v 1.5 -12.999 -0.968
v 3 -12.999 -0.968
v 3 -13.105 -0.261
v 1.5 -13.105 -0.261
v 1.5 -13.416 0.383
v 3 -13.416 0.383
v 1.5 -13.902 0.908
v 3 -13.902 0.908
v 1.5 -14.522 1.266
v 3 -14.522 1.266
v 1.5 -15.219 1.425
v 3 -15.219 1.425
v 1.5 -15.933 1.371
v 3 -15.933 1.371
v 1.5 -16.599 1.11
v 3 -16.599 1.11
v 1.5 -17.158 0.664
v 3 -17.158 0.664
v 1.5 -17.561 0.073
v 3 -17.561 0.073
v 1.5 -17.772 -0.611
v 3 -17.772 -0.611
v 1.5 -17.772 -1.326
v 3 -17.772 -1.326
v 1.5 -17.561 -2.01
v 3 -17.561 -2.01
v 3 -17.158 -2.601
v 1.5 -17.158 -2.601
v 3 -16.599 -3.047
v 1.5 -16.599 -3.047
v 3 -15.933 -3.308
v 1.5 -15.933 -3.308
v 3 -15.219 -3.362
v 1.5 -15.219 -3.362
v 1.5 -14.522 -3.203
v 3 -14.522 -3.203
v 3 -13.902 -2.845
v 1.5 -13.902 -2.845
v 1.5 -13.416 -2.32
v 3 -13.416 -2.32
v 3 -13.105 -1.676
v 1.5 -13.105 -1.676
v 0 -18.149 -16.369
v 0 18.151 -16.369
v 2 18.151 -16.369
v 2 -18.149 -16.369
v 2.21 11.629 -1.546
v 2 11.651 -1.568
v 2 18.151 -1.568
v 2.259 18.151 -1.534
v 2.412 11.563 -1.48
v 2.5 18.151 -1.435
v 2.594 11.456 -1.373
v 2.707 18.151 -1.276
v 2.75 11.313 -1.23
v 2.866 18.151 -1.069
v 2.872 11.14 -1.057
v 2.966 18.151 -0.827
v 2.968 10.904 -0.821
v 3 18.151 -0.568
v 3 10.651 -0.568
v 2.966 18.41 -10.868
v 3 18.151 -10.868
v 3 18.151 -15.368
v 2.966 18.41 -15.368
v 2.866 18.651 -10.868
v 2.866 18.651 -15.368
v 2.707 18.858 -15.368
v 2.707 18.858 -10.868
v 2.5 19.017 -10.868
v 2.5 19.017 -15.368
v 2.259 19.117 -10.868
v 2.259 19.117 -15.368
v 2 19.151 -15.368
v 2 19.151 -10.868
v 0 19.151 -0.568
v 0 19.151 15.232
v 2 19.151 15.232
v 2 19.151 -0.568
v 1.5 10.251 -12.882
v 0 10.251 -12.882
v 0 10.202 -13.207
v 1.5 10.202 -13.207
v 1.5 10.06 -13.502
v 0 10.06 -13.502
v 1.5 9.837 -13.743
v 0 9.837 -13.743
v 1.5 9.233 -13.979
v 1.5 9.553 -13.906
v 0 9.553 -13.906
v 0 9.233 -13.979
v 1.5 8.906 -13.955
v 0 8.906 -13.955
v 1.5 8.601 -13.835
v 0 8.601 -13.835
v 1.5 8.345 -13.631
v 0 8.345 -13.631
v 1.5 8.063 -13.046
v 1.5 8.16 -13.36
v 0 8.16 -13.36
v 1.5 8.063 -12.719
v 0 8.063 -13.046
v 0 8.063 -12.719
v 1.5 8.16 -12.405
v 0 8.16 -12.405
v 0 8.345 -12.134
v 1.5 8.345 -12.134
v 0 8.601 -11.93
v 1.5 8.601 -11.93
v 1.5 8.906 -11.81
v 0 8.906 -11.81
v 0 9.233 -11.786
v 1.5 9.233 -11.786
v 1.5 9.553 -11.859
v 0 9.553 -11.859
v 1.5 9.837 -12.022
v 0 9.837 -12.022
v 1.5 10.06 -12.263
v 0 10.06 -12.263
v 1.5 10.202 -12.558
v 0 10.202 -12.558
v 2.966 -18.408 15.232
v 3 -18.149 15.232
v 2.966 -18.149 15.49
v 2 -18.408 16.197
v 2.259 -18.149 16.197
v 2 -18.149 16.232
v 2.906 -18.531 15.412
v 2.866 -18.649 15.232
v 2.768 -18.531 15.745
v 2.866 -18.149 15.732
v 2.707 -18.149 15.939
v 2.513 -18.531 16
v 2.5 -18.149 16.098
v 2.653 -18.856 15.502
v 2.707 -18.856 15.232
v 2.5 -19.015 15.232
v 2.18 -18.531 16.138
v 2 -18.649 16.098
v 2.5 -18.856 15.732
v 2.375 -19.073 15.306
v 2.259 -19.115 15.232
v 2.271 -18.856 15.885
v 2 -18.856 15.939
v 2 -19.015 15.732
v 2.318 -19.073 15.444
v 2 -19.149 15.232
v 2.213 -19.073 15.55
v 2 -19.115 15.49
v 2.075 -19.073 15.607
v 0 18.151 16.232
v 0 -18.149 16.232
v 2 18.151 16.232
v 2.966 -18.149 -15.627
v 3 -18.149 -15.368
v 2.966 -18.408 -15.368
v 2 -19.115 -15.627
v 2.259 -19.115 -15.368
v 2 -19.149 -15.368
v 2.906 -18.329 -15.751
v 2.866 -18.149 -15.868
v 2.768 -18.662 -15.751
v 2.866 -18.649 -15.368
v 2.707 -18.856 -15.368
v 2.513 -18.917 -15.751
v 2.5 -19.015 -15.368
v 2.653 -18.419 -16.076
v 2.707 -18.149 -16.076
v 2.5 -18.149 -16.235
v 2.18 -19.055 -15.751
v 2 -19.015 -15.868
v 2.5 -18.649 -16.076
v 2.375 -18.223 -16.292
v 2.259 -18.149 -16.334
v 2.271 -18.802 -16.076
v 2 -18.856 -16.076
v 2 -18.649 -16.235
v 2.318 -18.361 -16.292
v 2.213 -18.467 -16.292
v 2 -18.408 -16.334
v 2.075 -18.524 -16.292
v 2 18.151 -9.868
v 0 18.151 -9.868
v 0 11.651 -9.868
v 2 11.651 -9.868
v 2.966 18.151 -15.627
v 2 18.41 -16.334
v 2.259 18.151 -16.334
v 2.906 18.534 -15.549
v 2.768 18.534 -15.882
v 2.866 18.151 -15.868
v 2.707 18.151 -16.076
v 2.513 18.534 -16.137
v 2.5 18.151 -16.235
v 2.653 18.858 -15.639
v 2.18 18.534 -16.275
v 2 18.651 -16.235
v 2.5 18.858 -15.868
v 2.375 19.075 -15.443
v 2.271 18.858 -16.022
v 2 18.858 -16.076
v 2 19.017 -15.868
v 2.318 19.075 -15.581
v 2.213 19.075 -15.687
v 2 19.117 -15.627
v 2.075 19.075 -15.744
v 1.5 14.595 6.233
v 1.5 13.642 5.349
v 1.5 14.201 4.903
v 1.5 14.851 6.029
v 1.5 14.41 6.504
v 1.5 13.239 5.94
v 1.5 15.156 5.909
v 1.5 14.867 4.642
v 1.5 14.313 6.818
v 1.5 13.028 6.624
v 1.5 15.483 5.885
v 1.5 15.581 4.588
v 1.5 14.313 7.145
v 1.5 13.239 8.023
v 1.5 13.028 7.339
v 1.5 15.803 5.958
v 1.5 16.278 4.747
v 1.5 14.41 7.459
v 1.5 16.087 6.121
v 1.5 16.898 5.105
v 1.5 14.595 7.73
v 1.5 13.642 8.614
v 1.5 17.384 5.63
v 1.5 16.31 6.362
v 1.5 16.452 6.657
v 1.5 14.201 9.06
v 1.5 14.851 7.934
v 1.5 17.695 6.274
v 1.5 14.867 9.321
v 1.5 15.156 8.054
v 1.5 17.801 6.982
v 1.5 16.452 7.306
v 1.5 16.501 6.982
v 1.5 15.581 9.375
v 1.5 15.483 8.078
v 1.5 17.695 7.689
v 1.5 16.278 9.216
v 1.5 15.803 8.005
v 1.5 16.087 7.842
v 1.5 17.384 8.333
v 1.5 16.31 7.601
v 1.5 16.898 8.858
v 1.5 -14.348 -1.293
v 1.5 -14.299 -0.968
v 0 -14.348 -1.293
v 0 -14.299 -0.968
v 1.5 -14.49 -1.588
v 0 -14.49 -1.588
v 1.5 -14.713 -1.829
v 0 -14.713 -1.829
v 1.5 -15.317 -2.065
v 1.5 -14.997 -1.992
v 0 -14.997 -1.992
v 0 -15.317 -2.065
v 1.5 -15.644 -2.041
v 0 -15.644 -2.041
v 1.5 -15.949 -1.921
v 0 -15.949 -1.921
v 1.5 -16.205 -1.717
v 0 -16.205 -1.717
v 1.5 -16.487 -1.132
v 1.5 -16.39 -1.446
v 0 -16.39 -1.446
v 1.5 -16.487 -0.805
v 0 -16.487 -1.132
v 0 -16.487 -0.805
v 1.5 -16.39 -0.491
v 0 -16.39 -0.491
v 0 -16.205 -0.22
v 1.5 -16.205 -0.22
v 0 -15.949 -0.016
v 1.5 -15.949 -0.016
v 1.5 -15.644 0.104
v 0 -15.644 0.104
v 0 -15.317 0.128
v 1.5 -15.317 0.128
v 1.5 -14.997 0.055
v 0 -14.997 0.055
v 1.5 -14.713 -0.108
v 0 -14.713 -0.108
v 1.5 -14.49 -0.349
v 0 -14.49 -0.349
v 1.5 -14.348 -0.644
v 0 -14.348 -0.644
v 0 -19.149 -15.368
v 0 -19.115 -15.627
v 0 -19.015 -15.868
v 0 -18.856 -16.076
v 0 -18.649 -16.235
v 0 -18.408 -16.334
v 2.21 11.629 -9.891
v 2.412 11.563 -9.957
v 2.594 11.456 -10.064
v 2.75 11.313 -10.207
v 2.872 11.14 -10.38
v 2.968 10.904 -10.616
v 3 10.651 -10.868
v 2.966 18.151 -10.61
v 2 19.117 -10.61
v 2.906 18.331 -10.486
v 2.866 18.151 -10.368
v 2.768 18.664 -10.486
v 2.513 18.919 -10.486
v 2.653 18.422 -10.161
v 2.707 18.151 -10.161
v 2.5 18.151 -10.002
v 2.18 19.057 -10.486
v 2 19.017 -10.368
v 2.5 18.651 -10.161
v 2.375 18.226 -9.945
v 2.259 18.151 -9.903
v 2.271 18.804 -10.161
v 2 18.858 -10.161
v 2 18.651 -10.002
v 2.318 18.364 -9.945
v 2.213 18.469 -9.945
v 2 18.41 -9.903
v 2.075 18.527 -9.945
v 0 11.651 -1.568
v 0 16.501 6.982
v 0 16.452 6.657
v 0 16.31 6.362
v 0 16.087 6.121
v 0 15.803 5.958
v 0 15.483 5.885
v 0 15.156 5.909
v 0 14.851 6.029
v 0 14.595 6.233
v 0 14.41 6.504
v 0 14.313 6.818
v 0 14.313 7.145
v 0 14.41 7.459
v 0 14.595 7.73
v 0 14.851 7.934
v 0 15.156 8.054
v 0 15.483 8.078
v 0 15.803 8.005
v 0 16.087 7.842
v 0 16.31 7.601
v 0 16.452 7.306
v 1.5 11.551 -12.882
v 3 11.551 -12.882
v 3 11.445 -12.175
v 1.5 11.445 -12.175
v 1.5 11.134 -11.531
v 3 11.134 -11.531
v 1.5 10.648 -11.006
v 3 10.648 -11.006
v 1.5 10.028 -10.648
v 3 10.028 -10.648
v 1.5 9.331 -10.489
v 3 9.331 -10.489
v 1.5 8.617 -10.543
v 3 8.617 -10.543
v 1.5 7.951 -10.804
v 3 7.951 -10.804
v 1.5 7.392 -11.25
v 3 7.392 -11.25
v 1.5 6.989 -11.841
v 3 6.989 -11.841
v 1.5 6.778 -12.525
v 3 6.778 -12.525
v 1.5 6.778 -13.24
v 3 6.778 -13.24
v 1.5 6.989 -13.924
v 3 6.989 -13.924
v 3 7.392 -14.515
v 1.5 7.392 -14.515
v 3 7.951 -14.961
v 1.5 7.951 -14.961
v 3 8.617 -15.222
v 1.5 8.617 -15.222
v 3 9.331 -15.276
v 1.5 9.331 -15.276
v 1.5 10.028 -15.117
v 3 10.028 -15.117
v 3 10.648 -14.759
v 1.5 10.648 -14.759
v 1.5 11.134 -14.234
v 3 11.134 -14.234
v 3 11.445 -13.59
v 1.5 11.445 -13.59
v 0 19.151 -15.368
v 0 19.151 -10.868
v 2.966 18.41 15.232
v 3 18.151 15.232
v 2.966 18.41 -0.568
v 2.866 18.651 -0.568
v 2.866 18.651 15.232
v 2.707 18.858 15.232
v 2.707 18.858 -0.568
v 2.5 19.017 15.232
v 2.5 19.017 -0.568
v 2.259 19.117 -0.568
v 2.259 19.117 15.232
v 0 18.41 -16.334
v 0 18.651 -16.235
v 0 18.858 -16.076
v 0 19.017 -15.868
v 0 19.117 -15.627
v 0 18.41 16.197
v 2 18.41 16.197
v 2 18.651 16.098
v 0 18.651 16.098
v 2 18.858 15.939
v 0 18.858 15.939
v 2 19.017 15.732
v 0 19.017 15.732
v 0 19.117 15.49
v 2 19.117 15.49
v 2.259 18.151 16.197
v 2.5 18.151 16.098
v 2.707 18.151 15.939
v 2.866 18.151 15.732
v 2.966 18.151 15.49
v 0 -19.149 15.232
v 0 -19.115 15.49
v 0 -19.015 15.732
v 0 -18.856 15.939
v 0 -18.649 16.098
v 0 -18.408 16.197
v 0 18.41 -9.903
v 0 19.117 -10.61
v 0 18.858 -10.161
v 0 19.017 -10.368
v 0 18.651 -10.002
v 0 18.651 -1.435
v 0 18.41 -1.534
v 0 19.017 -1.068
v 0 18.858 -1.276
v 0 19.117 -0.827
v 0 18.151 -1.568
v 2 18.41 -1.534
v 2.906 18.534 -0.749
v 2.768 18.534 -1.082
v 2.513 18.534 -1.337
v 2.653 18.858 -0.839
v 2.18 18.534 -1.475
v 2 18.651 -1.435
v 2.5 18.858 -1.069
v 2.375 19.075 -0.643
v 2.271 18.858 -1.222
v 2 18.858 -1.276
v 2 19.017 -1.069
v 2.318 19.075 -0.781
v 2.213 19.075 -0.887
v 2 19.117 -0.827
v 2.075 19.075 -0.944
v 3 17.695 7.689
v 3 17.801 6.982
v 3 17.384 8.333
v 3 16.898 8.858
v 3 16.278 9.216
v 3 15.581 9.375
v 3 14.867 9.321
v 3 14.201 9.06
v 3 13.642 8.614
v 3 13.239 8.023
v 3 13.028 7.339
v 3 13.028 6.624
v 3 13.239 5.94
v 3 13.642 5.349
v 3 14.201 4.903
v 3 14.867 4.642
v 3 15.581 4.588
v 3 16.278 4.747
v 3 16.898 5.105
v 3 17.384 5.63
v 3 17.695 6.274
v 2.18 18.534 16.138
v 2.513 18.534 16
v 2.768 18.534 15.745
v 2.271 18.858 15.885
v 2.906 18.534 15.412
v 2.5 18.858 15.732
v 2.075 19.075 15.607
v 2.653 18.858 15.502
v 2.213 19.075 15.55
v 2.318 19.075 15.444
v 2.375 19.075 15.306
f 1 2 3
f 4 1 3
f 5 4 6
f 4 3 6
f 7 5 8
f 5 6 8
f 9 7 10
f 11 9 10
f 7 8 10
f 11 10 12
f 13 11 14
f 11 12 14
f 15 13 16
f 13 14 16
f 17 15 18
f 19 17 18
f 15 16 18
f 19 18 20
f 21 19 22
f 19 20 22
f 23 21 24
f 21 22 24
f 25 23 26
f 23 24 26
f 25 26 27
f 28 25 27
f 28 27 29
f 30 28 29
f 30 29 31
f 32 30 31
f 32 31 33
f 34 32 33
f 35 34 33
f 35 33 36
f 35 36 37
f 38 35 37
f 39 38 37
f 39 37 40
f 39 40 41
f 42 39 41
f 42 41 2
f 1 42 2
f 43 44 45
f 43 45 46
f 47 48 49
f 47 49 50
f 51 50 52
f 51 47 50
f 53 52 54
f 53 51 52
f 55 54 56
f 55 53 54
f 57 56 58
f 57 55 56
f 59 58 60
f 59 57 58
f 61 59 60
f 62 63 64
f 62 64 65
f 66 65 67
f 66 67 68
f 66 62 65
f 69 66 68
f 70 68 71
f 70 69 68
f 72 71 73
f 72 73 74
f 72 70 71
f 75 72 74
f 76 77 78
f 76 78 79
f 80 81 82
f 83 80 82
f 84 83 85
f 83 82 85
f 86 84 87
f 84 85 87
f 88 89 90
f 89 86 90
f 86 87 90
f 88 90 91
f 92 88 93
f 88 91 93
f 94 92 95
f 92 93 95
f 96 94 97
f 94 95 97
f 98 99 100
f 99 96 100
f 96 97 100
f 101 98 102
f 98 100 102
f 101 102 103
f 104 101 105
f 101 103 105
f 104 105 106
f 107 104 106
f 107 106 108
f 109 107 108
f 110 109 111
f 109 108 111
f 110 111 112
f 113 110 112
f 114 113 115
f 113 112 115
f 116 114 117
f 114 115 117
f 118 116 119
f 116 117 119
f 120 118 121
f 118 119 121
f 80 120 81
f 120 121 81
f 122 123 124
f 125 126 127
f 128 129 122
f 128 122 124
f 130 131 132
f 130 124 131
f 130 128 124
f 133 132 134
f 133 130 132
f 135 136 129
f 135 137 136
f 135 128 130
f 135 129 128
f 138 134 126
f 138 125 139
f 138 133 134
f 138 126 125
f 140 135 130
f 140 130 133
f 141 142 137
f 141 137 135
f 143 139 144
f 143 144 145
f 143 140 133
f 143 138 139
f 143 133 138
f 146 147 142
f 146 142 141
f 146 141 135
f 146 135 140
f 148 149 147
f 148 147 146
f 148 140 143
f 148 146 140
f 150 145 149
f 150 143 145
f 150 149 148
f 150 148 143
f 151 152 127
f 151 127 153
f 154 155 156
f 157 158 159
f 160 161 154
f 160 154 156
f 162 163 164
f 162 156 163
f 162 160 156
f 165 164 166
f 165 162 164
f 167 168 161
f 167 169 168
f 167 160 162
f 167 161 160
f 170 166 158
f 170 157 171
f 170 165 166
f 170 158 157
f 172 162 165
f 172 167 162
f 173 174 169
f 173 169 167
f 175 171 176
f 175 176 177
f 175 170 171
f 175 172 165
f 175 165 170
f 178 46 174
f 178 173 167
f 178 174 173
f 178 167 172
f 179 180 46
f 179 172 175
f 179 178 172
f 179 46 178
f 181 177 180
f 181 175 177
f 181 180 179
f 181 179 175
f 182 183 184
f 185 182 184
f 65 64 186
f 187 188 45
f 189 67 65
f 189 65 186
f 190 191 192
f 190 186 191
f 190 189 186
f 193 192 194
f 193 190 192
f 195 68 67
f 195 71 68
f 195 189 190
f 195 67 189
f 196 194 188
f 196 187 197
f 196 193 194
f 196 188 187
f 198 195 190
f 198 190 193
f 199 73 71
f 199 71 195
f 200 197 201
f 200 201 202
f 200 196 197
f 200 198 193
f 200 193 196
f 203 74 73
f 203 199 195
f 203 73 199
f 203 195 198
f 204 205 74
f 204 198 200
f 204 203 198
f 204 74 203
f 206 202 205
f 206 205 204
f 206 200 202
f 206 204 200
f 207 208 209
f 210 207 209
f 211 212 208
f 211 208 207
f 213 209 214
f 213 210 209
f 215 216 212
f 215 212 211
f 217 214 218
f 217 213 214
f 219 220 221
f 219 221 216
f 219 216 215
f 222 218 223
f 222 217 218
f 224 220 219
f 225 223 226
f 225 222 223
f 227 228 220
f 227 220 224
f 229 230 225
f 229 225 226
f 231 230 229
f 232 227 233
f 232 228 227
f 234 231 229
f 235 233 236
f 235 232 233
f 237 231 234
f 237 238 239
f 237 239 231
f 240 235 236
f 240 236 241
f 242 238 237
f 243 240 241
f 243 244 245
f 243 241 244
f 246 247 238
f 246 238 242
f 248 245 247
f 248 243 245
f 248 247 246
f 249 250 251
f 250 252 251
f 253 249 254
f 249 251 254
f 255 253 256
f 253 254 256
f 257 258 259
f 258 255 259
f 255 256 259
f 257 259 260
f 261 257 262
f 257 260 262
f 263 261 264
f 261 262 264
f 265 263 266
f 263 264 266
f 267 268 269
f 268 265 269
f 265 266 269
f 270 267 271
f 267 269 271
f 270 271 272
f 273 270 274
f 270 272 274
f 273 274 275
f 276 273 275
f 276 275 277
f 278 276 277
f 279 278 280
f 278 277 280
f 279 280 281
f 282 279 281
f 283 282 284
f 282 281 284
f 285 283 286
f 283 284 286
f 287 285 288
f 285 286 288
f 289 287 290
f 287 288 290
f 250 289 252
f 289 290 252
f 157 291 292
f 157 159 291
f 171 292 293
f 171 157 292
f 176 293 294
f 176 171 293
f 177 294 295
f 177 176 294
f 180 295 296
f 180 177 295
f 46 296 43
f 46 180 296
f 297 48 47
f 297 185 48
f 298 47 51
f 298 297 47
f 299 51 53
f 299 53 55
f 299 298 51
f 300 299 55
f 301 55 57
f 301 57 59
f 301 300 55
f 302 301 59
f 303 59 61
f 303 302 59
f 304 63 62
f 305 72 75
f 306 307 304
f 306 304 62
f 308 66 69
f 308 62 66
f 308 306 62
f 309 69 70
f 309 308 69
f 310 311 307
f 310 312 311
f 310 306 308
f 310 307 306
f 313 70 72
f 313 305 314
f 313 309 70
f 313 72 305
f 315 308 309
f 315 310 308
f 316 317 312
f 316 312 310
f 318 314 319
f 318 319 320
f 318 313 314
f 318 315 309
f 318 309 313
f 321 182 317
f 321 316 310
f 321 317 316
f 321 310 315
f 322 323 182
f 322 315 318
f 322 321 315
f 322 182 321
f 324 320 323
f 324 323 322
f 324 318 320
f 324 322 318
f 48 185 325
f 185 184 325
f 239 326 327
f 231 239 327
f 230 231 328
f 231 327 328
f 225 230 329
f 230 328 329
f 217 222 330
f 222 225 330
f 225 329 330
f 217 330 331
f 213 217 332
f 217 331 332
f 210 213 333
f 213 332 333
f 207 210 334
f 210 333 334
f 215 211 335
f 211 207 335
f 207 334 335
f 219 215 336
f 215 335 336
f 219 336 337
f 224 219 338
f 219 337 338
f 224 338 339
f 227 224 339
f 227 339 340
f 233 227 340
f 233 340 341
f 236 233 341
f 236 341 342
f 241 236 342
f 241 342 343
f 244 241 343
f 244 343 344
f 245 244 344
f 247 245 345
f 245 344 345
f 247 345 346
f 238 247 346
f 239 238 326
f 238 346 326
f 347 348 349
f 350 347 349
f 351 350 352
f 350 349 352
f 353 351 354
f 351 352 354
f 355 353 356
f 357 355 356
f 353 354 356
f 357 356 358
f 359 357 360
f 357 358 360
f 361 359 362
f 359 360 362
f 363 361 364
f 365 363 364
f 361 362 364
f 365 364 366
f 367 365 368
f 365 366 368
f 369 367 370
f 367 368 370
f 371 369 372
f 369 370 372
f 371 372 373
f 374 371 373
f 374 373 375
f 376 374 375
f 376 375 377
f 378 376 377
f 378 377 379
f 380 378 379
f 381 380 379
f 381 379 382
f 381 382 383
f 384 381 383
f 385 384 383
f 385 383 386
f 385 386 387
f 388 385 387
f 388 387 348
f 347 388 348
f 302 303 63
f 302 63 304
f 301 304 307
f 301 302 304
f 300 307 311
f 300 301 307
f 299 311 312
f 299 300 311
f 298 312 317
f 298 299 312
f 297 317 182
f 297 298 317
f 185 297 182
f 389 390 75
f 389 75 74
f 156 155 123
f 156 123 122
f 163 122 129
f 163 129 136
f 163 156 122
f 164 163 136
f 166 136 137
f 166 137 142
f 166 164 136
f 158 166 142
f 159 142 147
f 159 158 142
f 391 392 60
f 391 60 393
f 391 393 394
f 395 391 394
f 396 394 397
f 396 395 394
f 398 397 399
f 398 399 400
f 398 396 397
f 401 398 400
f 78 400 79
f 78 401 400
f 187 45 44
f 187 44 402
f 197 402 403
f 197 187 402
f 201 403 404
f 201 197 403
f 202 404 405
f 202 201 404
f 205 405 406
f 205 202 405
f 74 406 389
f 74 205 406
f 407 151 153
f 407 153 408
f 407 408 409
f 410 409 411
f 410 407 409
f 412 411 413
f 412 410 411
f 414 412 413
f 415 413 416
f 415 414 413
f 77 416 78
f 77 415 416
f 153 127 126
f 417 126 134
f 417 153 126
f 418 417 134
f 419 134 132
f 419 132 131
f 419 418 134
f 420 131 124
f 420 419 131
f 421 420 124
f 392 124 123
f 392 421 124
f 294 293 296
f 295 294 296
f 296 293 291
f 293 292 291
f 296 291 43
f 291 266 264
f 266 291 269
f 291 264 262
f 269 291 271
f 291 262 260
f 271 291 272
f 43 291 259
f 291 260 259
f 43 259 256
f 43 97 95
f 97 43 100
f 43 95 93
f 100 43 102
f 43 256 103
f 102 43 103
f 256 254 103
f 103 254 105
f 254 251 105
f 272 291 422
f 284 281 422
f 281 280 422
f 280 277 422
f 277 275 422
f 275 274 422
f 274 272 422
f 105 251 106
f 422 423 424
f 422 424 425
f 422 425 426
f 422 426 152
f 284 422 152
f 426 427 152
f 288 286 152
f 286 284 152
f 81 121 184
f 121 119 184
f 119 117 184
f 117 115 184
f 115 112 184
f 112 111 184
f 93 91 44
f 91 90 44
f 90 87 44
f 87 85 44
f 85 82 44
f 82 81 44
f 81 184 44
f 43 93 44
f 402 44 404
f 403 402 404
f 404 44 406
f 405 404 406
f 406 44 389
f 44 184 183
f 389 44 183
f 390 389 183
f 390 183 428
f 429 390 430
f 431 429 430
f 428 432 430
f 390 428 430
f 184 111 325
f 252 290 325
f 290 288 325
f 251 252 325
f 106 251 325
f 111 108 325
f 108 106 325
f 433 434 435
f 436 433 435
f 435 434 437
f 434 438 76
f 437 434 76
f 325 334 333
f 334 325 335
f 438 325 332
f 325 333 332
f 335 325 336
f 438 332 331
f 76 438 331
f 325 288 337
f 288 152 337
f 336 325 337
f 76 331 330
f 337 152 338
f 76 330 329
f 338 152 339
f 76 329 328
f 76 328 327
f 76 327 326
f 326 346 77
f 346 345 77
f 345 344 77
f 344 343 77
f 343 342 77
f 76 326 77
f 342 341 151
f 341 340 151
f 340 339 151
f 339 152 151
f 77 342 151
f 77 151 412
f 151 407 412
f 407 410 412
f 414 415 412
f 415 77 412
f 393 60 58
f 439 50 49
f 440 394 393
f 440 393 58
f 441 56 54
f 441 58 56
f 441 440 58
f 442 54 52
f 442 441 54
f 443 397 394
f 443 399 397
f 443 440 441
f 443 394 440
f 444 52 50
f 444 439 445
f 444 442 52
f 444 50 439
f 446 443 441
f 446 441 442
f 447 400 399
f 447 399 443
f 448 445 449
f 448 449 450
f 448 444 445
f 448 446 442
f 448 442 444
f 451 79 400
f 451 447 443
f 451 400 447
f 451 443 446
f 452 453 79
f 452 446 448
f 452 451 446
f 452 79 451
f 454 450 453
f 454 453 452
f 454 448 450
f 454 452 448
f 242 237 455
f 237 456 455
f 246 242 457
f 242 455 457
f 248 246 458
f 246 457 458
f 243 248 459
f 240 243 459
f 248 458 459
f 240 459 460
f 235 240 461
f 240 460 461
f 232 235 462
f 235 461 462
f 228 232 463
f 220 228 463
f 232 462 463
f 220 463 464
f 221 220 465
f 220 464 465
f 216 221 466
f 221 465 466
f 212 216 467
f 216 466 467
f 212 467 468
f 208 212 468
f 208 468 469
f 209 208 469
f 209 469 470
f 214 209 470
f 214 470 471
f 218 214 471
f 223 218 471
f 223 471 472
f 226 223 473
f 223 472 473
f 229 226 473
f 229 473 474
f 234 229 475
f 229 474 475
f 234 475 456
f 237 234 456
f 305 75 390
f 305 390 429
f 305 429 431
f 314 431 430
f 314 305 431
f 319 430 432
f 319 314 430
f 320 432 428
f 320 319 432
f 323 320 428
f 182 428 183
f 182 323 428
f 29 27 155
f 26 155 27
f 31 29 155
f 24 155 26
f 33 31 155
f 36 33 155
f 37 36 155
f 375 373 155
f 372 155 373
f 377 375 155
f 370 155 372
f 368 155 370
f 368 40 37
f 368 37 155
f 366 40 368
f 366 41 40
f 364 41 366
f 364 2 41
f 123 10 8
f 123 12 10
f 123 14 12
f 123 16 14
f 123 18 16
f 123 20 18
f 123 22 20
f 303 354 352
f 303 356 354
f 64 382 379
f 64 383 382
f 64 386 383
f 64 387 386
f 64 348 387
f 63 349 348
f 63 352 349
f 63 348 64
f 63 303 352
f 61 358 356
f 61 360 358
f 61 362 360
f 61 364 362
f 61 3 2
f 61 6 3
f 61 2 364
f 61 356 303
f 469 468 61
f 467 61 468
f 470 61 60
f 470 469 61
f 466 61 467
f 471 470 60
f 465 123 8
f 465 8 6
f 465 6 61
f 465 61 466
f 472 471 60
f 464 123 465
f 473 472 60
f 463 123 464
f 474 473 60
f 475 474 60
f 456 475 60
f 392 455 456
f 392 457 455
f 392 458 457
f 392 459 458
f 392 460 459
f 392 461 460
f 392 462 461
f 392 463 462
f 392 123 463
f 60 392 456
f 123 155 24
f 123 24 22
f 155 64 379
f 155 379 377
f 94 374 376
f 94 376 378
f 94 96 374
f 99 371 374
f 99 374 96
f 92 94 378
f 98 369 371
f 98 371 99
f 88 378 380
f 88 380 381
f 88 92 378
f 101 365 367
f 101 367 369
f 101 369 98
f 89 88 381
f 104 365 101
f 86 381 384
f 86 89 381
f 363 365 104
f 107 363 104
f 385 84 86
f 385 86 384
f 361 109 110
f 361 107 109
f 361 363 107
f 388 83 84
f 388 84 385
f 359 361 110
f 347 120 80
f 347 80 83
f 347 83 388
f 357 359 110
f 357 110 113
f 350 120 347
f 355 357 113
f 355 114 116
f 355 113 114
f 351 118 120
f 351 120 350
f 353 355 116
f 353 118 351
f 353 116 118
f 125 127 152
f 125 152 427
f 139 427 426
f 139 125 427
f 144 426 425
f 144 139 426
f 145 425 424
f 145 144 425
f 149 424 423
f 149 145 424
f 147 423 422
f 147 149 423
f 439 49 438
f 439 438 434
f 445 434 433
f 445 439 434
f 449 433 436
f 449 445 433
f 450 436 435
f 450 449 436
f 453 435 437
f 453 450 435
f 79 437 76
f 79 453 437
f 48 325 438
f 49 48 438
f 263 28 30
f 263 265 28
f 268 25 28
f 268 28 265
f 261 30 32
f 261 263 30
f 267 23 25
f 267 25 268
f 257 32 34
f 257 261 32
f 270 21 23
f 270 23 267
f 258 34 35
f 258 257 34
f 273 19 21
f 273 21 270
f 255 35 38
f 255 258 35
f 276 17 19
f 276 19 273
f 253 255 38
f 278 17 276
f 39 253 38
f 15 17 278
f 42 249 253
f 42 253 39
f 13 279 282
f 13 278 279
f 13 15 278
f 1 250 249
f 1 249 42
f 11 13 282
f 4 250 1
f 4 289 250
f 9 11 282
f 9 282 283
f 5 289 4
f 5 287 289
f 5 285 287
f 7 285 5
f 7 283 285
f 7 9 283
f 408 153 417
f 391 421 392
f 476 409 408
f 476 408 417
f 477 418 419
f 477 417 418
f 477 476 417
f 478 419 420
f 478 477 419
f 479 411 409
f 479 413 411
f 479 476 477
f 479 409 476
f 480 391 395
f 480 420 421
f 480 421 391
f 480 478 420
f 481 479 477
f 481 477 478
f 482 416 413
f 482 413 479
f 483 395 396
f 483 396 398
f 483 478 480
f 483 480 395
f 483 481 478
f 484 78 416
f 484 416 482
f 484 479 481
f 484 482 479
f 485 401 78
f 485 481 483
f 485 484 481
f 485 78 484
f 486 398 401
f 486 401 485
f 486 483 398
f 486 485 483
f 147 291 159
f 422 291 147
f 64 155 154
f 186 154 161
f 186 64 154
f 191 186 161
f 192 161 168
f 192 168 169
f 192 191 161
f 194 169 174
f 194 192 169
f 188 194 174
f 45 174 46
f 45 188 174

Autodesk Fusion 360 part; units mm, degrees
sketch "Sketch1" plane through (0, 0, 0) normal (1, 0, 0) x (0, 1, 0)
  line L0 (-19.1488, 16.2315) -> (19.1512, 16.2315)
  line L1 (19.1512, 16.2315) -> (19.1512, -16.3685)
  line L2 (19.1512, -16.3685) -> (-19.1488, -16.3685)
  line L3 (-19.1488, -16.3685) -> (-19.1488, 16.2315)
  circle A0 centre (-15.3988, -0.9685) radius 1.1
  circle A1 centre (15.4012, 6.9815) radius 1.1
  circle A2 centre (9.1512, -12.8825) radius 1.1
  line L4 (19.1512, -9.8685) -> (11.6512, -9.8685)
  line L5 (11.6512, -9.8685) -> (11.6512, -1.5685)
  line L6 (11.6512, -1.5685) -> (19.1512, -1.5685)
  line L7 (19.1512, -1.5685) -> (19.1512, -9.8685)
  dimension "d1" = 38.3
  dimension "d2" = 32.6
  dimension "d3" = 2.2
  dimension "d4" = 15.4
  dimension "d5" = 3.75
  dimension "d6" = 2.2
  dimension "d7" = 9.25
  dimension "d8" = 3.75
  dimension "d9" = 2.2
  dimension "d10" = 10
  dimension "d11" = 3.486
  dimension "d23" = 7.5
  dimension "d24" = 8.3
  dimension "d25" = 6.5
extrude "Extrude1" add sketch "Sketch1" along normal blind 3
sketch "Sketch2" plane through (3, 0, 0) normal (1, 0, 0) x (0, 1, 0)
  circle A0 centre (9.1512, -12.8825) radius 1.1
  circle A1 centre (15.4012, 6.9815) radius 1.1
  circle A2 centre (-15.3988, -0.9685) radius 1.1
  line L0 (-19.1488, -16.3685) -> (19.1512, -16.3685)
  line L1 (19.1512, -16.3685) -> (19.1512, 16.2315)
  line L2 (19.1512, 16.2315) -> (-19.1488, 16.2315)
  line L3 (-19.1488, 16.2315) -> (-19.1488, -16.3685)
  circle A3 centre (-15.3988, -0.9685) radius 2.4
  circle A4 centre (9.1512, -12.8825) radius 2.4
  circle A5 centre (15.4012, 6.9815) radius 2.4
  dimension "d14" = 4.8
  dimension "d15" = 4.8
  dimension "d16" = 4.8
extrude "Extrude2" cut sketch "Sketch2" against normal blind 1.5 contours A3
extrude "Extrude3" cut sketch "Sketch2" against normal blind 1.5 contours A4
extrude "Extrude4" cut sketch "Sketch2" against normal blind 1.5 contours A5
extrude "Extrude5" cut sketch "Sketch1" along normal blind 3 contours L1 L4 L5 L6 L7
fillet "Fillet1" radius 1 1 edges at (3, 0.0012, 16.2315)
fillet "Fillet2" radius 1 3 edges at (1, -19.1488, 16.2315) (2.7071, -19.1488, 15.9387) (3, -19.1488, -0.5685)
fillet "Fillet3" radius 1 3 edges at (1, -19.1488, -16.3685) (2.7071, -18.856, -16.3685) (3, 0.5012, -16.3685)
fillet "Fillet4" radius 1 3 edges at (1, 19.1512, -16.3685) (2.7071, 19.1512, -16.0756) (3, 19.1512, -12.6185)
fillet "Fillet5" radius 1 3 edges at (1, 19.1512, -9.8685) (2.7071, 18.8583, -9.8685) (3, 14.9012, -9.8685)
fillet "Fillet6" radius 1 1 edges at (3, 11.6512, -6.2185)
fillet "Fillet7" radius 1 1 edges at (3, 14.9012, -1.5685)
fillet "Fillet8" radius 1 5 edges at (1, 19.1512, -1.5685) (2.7071, 19.1512, -1.2756) (3, 19.1512, 7.3315) (2.7071, 19.1512, 15.9387) (1, 19.1512, 16.2315)
